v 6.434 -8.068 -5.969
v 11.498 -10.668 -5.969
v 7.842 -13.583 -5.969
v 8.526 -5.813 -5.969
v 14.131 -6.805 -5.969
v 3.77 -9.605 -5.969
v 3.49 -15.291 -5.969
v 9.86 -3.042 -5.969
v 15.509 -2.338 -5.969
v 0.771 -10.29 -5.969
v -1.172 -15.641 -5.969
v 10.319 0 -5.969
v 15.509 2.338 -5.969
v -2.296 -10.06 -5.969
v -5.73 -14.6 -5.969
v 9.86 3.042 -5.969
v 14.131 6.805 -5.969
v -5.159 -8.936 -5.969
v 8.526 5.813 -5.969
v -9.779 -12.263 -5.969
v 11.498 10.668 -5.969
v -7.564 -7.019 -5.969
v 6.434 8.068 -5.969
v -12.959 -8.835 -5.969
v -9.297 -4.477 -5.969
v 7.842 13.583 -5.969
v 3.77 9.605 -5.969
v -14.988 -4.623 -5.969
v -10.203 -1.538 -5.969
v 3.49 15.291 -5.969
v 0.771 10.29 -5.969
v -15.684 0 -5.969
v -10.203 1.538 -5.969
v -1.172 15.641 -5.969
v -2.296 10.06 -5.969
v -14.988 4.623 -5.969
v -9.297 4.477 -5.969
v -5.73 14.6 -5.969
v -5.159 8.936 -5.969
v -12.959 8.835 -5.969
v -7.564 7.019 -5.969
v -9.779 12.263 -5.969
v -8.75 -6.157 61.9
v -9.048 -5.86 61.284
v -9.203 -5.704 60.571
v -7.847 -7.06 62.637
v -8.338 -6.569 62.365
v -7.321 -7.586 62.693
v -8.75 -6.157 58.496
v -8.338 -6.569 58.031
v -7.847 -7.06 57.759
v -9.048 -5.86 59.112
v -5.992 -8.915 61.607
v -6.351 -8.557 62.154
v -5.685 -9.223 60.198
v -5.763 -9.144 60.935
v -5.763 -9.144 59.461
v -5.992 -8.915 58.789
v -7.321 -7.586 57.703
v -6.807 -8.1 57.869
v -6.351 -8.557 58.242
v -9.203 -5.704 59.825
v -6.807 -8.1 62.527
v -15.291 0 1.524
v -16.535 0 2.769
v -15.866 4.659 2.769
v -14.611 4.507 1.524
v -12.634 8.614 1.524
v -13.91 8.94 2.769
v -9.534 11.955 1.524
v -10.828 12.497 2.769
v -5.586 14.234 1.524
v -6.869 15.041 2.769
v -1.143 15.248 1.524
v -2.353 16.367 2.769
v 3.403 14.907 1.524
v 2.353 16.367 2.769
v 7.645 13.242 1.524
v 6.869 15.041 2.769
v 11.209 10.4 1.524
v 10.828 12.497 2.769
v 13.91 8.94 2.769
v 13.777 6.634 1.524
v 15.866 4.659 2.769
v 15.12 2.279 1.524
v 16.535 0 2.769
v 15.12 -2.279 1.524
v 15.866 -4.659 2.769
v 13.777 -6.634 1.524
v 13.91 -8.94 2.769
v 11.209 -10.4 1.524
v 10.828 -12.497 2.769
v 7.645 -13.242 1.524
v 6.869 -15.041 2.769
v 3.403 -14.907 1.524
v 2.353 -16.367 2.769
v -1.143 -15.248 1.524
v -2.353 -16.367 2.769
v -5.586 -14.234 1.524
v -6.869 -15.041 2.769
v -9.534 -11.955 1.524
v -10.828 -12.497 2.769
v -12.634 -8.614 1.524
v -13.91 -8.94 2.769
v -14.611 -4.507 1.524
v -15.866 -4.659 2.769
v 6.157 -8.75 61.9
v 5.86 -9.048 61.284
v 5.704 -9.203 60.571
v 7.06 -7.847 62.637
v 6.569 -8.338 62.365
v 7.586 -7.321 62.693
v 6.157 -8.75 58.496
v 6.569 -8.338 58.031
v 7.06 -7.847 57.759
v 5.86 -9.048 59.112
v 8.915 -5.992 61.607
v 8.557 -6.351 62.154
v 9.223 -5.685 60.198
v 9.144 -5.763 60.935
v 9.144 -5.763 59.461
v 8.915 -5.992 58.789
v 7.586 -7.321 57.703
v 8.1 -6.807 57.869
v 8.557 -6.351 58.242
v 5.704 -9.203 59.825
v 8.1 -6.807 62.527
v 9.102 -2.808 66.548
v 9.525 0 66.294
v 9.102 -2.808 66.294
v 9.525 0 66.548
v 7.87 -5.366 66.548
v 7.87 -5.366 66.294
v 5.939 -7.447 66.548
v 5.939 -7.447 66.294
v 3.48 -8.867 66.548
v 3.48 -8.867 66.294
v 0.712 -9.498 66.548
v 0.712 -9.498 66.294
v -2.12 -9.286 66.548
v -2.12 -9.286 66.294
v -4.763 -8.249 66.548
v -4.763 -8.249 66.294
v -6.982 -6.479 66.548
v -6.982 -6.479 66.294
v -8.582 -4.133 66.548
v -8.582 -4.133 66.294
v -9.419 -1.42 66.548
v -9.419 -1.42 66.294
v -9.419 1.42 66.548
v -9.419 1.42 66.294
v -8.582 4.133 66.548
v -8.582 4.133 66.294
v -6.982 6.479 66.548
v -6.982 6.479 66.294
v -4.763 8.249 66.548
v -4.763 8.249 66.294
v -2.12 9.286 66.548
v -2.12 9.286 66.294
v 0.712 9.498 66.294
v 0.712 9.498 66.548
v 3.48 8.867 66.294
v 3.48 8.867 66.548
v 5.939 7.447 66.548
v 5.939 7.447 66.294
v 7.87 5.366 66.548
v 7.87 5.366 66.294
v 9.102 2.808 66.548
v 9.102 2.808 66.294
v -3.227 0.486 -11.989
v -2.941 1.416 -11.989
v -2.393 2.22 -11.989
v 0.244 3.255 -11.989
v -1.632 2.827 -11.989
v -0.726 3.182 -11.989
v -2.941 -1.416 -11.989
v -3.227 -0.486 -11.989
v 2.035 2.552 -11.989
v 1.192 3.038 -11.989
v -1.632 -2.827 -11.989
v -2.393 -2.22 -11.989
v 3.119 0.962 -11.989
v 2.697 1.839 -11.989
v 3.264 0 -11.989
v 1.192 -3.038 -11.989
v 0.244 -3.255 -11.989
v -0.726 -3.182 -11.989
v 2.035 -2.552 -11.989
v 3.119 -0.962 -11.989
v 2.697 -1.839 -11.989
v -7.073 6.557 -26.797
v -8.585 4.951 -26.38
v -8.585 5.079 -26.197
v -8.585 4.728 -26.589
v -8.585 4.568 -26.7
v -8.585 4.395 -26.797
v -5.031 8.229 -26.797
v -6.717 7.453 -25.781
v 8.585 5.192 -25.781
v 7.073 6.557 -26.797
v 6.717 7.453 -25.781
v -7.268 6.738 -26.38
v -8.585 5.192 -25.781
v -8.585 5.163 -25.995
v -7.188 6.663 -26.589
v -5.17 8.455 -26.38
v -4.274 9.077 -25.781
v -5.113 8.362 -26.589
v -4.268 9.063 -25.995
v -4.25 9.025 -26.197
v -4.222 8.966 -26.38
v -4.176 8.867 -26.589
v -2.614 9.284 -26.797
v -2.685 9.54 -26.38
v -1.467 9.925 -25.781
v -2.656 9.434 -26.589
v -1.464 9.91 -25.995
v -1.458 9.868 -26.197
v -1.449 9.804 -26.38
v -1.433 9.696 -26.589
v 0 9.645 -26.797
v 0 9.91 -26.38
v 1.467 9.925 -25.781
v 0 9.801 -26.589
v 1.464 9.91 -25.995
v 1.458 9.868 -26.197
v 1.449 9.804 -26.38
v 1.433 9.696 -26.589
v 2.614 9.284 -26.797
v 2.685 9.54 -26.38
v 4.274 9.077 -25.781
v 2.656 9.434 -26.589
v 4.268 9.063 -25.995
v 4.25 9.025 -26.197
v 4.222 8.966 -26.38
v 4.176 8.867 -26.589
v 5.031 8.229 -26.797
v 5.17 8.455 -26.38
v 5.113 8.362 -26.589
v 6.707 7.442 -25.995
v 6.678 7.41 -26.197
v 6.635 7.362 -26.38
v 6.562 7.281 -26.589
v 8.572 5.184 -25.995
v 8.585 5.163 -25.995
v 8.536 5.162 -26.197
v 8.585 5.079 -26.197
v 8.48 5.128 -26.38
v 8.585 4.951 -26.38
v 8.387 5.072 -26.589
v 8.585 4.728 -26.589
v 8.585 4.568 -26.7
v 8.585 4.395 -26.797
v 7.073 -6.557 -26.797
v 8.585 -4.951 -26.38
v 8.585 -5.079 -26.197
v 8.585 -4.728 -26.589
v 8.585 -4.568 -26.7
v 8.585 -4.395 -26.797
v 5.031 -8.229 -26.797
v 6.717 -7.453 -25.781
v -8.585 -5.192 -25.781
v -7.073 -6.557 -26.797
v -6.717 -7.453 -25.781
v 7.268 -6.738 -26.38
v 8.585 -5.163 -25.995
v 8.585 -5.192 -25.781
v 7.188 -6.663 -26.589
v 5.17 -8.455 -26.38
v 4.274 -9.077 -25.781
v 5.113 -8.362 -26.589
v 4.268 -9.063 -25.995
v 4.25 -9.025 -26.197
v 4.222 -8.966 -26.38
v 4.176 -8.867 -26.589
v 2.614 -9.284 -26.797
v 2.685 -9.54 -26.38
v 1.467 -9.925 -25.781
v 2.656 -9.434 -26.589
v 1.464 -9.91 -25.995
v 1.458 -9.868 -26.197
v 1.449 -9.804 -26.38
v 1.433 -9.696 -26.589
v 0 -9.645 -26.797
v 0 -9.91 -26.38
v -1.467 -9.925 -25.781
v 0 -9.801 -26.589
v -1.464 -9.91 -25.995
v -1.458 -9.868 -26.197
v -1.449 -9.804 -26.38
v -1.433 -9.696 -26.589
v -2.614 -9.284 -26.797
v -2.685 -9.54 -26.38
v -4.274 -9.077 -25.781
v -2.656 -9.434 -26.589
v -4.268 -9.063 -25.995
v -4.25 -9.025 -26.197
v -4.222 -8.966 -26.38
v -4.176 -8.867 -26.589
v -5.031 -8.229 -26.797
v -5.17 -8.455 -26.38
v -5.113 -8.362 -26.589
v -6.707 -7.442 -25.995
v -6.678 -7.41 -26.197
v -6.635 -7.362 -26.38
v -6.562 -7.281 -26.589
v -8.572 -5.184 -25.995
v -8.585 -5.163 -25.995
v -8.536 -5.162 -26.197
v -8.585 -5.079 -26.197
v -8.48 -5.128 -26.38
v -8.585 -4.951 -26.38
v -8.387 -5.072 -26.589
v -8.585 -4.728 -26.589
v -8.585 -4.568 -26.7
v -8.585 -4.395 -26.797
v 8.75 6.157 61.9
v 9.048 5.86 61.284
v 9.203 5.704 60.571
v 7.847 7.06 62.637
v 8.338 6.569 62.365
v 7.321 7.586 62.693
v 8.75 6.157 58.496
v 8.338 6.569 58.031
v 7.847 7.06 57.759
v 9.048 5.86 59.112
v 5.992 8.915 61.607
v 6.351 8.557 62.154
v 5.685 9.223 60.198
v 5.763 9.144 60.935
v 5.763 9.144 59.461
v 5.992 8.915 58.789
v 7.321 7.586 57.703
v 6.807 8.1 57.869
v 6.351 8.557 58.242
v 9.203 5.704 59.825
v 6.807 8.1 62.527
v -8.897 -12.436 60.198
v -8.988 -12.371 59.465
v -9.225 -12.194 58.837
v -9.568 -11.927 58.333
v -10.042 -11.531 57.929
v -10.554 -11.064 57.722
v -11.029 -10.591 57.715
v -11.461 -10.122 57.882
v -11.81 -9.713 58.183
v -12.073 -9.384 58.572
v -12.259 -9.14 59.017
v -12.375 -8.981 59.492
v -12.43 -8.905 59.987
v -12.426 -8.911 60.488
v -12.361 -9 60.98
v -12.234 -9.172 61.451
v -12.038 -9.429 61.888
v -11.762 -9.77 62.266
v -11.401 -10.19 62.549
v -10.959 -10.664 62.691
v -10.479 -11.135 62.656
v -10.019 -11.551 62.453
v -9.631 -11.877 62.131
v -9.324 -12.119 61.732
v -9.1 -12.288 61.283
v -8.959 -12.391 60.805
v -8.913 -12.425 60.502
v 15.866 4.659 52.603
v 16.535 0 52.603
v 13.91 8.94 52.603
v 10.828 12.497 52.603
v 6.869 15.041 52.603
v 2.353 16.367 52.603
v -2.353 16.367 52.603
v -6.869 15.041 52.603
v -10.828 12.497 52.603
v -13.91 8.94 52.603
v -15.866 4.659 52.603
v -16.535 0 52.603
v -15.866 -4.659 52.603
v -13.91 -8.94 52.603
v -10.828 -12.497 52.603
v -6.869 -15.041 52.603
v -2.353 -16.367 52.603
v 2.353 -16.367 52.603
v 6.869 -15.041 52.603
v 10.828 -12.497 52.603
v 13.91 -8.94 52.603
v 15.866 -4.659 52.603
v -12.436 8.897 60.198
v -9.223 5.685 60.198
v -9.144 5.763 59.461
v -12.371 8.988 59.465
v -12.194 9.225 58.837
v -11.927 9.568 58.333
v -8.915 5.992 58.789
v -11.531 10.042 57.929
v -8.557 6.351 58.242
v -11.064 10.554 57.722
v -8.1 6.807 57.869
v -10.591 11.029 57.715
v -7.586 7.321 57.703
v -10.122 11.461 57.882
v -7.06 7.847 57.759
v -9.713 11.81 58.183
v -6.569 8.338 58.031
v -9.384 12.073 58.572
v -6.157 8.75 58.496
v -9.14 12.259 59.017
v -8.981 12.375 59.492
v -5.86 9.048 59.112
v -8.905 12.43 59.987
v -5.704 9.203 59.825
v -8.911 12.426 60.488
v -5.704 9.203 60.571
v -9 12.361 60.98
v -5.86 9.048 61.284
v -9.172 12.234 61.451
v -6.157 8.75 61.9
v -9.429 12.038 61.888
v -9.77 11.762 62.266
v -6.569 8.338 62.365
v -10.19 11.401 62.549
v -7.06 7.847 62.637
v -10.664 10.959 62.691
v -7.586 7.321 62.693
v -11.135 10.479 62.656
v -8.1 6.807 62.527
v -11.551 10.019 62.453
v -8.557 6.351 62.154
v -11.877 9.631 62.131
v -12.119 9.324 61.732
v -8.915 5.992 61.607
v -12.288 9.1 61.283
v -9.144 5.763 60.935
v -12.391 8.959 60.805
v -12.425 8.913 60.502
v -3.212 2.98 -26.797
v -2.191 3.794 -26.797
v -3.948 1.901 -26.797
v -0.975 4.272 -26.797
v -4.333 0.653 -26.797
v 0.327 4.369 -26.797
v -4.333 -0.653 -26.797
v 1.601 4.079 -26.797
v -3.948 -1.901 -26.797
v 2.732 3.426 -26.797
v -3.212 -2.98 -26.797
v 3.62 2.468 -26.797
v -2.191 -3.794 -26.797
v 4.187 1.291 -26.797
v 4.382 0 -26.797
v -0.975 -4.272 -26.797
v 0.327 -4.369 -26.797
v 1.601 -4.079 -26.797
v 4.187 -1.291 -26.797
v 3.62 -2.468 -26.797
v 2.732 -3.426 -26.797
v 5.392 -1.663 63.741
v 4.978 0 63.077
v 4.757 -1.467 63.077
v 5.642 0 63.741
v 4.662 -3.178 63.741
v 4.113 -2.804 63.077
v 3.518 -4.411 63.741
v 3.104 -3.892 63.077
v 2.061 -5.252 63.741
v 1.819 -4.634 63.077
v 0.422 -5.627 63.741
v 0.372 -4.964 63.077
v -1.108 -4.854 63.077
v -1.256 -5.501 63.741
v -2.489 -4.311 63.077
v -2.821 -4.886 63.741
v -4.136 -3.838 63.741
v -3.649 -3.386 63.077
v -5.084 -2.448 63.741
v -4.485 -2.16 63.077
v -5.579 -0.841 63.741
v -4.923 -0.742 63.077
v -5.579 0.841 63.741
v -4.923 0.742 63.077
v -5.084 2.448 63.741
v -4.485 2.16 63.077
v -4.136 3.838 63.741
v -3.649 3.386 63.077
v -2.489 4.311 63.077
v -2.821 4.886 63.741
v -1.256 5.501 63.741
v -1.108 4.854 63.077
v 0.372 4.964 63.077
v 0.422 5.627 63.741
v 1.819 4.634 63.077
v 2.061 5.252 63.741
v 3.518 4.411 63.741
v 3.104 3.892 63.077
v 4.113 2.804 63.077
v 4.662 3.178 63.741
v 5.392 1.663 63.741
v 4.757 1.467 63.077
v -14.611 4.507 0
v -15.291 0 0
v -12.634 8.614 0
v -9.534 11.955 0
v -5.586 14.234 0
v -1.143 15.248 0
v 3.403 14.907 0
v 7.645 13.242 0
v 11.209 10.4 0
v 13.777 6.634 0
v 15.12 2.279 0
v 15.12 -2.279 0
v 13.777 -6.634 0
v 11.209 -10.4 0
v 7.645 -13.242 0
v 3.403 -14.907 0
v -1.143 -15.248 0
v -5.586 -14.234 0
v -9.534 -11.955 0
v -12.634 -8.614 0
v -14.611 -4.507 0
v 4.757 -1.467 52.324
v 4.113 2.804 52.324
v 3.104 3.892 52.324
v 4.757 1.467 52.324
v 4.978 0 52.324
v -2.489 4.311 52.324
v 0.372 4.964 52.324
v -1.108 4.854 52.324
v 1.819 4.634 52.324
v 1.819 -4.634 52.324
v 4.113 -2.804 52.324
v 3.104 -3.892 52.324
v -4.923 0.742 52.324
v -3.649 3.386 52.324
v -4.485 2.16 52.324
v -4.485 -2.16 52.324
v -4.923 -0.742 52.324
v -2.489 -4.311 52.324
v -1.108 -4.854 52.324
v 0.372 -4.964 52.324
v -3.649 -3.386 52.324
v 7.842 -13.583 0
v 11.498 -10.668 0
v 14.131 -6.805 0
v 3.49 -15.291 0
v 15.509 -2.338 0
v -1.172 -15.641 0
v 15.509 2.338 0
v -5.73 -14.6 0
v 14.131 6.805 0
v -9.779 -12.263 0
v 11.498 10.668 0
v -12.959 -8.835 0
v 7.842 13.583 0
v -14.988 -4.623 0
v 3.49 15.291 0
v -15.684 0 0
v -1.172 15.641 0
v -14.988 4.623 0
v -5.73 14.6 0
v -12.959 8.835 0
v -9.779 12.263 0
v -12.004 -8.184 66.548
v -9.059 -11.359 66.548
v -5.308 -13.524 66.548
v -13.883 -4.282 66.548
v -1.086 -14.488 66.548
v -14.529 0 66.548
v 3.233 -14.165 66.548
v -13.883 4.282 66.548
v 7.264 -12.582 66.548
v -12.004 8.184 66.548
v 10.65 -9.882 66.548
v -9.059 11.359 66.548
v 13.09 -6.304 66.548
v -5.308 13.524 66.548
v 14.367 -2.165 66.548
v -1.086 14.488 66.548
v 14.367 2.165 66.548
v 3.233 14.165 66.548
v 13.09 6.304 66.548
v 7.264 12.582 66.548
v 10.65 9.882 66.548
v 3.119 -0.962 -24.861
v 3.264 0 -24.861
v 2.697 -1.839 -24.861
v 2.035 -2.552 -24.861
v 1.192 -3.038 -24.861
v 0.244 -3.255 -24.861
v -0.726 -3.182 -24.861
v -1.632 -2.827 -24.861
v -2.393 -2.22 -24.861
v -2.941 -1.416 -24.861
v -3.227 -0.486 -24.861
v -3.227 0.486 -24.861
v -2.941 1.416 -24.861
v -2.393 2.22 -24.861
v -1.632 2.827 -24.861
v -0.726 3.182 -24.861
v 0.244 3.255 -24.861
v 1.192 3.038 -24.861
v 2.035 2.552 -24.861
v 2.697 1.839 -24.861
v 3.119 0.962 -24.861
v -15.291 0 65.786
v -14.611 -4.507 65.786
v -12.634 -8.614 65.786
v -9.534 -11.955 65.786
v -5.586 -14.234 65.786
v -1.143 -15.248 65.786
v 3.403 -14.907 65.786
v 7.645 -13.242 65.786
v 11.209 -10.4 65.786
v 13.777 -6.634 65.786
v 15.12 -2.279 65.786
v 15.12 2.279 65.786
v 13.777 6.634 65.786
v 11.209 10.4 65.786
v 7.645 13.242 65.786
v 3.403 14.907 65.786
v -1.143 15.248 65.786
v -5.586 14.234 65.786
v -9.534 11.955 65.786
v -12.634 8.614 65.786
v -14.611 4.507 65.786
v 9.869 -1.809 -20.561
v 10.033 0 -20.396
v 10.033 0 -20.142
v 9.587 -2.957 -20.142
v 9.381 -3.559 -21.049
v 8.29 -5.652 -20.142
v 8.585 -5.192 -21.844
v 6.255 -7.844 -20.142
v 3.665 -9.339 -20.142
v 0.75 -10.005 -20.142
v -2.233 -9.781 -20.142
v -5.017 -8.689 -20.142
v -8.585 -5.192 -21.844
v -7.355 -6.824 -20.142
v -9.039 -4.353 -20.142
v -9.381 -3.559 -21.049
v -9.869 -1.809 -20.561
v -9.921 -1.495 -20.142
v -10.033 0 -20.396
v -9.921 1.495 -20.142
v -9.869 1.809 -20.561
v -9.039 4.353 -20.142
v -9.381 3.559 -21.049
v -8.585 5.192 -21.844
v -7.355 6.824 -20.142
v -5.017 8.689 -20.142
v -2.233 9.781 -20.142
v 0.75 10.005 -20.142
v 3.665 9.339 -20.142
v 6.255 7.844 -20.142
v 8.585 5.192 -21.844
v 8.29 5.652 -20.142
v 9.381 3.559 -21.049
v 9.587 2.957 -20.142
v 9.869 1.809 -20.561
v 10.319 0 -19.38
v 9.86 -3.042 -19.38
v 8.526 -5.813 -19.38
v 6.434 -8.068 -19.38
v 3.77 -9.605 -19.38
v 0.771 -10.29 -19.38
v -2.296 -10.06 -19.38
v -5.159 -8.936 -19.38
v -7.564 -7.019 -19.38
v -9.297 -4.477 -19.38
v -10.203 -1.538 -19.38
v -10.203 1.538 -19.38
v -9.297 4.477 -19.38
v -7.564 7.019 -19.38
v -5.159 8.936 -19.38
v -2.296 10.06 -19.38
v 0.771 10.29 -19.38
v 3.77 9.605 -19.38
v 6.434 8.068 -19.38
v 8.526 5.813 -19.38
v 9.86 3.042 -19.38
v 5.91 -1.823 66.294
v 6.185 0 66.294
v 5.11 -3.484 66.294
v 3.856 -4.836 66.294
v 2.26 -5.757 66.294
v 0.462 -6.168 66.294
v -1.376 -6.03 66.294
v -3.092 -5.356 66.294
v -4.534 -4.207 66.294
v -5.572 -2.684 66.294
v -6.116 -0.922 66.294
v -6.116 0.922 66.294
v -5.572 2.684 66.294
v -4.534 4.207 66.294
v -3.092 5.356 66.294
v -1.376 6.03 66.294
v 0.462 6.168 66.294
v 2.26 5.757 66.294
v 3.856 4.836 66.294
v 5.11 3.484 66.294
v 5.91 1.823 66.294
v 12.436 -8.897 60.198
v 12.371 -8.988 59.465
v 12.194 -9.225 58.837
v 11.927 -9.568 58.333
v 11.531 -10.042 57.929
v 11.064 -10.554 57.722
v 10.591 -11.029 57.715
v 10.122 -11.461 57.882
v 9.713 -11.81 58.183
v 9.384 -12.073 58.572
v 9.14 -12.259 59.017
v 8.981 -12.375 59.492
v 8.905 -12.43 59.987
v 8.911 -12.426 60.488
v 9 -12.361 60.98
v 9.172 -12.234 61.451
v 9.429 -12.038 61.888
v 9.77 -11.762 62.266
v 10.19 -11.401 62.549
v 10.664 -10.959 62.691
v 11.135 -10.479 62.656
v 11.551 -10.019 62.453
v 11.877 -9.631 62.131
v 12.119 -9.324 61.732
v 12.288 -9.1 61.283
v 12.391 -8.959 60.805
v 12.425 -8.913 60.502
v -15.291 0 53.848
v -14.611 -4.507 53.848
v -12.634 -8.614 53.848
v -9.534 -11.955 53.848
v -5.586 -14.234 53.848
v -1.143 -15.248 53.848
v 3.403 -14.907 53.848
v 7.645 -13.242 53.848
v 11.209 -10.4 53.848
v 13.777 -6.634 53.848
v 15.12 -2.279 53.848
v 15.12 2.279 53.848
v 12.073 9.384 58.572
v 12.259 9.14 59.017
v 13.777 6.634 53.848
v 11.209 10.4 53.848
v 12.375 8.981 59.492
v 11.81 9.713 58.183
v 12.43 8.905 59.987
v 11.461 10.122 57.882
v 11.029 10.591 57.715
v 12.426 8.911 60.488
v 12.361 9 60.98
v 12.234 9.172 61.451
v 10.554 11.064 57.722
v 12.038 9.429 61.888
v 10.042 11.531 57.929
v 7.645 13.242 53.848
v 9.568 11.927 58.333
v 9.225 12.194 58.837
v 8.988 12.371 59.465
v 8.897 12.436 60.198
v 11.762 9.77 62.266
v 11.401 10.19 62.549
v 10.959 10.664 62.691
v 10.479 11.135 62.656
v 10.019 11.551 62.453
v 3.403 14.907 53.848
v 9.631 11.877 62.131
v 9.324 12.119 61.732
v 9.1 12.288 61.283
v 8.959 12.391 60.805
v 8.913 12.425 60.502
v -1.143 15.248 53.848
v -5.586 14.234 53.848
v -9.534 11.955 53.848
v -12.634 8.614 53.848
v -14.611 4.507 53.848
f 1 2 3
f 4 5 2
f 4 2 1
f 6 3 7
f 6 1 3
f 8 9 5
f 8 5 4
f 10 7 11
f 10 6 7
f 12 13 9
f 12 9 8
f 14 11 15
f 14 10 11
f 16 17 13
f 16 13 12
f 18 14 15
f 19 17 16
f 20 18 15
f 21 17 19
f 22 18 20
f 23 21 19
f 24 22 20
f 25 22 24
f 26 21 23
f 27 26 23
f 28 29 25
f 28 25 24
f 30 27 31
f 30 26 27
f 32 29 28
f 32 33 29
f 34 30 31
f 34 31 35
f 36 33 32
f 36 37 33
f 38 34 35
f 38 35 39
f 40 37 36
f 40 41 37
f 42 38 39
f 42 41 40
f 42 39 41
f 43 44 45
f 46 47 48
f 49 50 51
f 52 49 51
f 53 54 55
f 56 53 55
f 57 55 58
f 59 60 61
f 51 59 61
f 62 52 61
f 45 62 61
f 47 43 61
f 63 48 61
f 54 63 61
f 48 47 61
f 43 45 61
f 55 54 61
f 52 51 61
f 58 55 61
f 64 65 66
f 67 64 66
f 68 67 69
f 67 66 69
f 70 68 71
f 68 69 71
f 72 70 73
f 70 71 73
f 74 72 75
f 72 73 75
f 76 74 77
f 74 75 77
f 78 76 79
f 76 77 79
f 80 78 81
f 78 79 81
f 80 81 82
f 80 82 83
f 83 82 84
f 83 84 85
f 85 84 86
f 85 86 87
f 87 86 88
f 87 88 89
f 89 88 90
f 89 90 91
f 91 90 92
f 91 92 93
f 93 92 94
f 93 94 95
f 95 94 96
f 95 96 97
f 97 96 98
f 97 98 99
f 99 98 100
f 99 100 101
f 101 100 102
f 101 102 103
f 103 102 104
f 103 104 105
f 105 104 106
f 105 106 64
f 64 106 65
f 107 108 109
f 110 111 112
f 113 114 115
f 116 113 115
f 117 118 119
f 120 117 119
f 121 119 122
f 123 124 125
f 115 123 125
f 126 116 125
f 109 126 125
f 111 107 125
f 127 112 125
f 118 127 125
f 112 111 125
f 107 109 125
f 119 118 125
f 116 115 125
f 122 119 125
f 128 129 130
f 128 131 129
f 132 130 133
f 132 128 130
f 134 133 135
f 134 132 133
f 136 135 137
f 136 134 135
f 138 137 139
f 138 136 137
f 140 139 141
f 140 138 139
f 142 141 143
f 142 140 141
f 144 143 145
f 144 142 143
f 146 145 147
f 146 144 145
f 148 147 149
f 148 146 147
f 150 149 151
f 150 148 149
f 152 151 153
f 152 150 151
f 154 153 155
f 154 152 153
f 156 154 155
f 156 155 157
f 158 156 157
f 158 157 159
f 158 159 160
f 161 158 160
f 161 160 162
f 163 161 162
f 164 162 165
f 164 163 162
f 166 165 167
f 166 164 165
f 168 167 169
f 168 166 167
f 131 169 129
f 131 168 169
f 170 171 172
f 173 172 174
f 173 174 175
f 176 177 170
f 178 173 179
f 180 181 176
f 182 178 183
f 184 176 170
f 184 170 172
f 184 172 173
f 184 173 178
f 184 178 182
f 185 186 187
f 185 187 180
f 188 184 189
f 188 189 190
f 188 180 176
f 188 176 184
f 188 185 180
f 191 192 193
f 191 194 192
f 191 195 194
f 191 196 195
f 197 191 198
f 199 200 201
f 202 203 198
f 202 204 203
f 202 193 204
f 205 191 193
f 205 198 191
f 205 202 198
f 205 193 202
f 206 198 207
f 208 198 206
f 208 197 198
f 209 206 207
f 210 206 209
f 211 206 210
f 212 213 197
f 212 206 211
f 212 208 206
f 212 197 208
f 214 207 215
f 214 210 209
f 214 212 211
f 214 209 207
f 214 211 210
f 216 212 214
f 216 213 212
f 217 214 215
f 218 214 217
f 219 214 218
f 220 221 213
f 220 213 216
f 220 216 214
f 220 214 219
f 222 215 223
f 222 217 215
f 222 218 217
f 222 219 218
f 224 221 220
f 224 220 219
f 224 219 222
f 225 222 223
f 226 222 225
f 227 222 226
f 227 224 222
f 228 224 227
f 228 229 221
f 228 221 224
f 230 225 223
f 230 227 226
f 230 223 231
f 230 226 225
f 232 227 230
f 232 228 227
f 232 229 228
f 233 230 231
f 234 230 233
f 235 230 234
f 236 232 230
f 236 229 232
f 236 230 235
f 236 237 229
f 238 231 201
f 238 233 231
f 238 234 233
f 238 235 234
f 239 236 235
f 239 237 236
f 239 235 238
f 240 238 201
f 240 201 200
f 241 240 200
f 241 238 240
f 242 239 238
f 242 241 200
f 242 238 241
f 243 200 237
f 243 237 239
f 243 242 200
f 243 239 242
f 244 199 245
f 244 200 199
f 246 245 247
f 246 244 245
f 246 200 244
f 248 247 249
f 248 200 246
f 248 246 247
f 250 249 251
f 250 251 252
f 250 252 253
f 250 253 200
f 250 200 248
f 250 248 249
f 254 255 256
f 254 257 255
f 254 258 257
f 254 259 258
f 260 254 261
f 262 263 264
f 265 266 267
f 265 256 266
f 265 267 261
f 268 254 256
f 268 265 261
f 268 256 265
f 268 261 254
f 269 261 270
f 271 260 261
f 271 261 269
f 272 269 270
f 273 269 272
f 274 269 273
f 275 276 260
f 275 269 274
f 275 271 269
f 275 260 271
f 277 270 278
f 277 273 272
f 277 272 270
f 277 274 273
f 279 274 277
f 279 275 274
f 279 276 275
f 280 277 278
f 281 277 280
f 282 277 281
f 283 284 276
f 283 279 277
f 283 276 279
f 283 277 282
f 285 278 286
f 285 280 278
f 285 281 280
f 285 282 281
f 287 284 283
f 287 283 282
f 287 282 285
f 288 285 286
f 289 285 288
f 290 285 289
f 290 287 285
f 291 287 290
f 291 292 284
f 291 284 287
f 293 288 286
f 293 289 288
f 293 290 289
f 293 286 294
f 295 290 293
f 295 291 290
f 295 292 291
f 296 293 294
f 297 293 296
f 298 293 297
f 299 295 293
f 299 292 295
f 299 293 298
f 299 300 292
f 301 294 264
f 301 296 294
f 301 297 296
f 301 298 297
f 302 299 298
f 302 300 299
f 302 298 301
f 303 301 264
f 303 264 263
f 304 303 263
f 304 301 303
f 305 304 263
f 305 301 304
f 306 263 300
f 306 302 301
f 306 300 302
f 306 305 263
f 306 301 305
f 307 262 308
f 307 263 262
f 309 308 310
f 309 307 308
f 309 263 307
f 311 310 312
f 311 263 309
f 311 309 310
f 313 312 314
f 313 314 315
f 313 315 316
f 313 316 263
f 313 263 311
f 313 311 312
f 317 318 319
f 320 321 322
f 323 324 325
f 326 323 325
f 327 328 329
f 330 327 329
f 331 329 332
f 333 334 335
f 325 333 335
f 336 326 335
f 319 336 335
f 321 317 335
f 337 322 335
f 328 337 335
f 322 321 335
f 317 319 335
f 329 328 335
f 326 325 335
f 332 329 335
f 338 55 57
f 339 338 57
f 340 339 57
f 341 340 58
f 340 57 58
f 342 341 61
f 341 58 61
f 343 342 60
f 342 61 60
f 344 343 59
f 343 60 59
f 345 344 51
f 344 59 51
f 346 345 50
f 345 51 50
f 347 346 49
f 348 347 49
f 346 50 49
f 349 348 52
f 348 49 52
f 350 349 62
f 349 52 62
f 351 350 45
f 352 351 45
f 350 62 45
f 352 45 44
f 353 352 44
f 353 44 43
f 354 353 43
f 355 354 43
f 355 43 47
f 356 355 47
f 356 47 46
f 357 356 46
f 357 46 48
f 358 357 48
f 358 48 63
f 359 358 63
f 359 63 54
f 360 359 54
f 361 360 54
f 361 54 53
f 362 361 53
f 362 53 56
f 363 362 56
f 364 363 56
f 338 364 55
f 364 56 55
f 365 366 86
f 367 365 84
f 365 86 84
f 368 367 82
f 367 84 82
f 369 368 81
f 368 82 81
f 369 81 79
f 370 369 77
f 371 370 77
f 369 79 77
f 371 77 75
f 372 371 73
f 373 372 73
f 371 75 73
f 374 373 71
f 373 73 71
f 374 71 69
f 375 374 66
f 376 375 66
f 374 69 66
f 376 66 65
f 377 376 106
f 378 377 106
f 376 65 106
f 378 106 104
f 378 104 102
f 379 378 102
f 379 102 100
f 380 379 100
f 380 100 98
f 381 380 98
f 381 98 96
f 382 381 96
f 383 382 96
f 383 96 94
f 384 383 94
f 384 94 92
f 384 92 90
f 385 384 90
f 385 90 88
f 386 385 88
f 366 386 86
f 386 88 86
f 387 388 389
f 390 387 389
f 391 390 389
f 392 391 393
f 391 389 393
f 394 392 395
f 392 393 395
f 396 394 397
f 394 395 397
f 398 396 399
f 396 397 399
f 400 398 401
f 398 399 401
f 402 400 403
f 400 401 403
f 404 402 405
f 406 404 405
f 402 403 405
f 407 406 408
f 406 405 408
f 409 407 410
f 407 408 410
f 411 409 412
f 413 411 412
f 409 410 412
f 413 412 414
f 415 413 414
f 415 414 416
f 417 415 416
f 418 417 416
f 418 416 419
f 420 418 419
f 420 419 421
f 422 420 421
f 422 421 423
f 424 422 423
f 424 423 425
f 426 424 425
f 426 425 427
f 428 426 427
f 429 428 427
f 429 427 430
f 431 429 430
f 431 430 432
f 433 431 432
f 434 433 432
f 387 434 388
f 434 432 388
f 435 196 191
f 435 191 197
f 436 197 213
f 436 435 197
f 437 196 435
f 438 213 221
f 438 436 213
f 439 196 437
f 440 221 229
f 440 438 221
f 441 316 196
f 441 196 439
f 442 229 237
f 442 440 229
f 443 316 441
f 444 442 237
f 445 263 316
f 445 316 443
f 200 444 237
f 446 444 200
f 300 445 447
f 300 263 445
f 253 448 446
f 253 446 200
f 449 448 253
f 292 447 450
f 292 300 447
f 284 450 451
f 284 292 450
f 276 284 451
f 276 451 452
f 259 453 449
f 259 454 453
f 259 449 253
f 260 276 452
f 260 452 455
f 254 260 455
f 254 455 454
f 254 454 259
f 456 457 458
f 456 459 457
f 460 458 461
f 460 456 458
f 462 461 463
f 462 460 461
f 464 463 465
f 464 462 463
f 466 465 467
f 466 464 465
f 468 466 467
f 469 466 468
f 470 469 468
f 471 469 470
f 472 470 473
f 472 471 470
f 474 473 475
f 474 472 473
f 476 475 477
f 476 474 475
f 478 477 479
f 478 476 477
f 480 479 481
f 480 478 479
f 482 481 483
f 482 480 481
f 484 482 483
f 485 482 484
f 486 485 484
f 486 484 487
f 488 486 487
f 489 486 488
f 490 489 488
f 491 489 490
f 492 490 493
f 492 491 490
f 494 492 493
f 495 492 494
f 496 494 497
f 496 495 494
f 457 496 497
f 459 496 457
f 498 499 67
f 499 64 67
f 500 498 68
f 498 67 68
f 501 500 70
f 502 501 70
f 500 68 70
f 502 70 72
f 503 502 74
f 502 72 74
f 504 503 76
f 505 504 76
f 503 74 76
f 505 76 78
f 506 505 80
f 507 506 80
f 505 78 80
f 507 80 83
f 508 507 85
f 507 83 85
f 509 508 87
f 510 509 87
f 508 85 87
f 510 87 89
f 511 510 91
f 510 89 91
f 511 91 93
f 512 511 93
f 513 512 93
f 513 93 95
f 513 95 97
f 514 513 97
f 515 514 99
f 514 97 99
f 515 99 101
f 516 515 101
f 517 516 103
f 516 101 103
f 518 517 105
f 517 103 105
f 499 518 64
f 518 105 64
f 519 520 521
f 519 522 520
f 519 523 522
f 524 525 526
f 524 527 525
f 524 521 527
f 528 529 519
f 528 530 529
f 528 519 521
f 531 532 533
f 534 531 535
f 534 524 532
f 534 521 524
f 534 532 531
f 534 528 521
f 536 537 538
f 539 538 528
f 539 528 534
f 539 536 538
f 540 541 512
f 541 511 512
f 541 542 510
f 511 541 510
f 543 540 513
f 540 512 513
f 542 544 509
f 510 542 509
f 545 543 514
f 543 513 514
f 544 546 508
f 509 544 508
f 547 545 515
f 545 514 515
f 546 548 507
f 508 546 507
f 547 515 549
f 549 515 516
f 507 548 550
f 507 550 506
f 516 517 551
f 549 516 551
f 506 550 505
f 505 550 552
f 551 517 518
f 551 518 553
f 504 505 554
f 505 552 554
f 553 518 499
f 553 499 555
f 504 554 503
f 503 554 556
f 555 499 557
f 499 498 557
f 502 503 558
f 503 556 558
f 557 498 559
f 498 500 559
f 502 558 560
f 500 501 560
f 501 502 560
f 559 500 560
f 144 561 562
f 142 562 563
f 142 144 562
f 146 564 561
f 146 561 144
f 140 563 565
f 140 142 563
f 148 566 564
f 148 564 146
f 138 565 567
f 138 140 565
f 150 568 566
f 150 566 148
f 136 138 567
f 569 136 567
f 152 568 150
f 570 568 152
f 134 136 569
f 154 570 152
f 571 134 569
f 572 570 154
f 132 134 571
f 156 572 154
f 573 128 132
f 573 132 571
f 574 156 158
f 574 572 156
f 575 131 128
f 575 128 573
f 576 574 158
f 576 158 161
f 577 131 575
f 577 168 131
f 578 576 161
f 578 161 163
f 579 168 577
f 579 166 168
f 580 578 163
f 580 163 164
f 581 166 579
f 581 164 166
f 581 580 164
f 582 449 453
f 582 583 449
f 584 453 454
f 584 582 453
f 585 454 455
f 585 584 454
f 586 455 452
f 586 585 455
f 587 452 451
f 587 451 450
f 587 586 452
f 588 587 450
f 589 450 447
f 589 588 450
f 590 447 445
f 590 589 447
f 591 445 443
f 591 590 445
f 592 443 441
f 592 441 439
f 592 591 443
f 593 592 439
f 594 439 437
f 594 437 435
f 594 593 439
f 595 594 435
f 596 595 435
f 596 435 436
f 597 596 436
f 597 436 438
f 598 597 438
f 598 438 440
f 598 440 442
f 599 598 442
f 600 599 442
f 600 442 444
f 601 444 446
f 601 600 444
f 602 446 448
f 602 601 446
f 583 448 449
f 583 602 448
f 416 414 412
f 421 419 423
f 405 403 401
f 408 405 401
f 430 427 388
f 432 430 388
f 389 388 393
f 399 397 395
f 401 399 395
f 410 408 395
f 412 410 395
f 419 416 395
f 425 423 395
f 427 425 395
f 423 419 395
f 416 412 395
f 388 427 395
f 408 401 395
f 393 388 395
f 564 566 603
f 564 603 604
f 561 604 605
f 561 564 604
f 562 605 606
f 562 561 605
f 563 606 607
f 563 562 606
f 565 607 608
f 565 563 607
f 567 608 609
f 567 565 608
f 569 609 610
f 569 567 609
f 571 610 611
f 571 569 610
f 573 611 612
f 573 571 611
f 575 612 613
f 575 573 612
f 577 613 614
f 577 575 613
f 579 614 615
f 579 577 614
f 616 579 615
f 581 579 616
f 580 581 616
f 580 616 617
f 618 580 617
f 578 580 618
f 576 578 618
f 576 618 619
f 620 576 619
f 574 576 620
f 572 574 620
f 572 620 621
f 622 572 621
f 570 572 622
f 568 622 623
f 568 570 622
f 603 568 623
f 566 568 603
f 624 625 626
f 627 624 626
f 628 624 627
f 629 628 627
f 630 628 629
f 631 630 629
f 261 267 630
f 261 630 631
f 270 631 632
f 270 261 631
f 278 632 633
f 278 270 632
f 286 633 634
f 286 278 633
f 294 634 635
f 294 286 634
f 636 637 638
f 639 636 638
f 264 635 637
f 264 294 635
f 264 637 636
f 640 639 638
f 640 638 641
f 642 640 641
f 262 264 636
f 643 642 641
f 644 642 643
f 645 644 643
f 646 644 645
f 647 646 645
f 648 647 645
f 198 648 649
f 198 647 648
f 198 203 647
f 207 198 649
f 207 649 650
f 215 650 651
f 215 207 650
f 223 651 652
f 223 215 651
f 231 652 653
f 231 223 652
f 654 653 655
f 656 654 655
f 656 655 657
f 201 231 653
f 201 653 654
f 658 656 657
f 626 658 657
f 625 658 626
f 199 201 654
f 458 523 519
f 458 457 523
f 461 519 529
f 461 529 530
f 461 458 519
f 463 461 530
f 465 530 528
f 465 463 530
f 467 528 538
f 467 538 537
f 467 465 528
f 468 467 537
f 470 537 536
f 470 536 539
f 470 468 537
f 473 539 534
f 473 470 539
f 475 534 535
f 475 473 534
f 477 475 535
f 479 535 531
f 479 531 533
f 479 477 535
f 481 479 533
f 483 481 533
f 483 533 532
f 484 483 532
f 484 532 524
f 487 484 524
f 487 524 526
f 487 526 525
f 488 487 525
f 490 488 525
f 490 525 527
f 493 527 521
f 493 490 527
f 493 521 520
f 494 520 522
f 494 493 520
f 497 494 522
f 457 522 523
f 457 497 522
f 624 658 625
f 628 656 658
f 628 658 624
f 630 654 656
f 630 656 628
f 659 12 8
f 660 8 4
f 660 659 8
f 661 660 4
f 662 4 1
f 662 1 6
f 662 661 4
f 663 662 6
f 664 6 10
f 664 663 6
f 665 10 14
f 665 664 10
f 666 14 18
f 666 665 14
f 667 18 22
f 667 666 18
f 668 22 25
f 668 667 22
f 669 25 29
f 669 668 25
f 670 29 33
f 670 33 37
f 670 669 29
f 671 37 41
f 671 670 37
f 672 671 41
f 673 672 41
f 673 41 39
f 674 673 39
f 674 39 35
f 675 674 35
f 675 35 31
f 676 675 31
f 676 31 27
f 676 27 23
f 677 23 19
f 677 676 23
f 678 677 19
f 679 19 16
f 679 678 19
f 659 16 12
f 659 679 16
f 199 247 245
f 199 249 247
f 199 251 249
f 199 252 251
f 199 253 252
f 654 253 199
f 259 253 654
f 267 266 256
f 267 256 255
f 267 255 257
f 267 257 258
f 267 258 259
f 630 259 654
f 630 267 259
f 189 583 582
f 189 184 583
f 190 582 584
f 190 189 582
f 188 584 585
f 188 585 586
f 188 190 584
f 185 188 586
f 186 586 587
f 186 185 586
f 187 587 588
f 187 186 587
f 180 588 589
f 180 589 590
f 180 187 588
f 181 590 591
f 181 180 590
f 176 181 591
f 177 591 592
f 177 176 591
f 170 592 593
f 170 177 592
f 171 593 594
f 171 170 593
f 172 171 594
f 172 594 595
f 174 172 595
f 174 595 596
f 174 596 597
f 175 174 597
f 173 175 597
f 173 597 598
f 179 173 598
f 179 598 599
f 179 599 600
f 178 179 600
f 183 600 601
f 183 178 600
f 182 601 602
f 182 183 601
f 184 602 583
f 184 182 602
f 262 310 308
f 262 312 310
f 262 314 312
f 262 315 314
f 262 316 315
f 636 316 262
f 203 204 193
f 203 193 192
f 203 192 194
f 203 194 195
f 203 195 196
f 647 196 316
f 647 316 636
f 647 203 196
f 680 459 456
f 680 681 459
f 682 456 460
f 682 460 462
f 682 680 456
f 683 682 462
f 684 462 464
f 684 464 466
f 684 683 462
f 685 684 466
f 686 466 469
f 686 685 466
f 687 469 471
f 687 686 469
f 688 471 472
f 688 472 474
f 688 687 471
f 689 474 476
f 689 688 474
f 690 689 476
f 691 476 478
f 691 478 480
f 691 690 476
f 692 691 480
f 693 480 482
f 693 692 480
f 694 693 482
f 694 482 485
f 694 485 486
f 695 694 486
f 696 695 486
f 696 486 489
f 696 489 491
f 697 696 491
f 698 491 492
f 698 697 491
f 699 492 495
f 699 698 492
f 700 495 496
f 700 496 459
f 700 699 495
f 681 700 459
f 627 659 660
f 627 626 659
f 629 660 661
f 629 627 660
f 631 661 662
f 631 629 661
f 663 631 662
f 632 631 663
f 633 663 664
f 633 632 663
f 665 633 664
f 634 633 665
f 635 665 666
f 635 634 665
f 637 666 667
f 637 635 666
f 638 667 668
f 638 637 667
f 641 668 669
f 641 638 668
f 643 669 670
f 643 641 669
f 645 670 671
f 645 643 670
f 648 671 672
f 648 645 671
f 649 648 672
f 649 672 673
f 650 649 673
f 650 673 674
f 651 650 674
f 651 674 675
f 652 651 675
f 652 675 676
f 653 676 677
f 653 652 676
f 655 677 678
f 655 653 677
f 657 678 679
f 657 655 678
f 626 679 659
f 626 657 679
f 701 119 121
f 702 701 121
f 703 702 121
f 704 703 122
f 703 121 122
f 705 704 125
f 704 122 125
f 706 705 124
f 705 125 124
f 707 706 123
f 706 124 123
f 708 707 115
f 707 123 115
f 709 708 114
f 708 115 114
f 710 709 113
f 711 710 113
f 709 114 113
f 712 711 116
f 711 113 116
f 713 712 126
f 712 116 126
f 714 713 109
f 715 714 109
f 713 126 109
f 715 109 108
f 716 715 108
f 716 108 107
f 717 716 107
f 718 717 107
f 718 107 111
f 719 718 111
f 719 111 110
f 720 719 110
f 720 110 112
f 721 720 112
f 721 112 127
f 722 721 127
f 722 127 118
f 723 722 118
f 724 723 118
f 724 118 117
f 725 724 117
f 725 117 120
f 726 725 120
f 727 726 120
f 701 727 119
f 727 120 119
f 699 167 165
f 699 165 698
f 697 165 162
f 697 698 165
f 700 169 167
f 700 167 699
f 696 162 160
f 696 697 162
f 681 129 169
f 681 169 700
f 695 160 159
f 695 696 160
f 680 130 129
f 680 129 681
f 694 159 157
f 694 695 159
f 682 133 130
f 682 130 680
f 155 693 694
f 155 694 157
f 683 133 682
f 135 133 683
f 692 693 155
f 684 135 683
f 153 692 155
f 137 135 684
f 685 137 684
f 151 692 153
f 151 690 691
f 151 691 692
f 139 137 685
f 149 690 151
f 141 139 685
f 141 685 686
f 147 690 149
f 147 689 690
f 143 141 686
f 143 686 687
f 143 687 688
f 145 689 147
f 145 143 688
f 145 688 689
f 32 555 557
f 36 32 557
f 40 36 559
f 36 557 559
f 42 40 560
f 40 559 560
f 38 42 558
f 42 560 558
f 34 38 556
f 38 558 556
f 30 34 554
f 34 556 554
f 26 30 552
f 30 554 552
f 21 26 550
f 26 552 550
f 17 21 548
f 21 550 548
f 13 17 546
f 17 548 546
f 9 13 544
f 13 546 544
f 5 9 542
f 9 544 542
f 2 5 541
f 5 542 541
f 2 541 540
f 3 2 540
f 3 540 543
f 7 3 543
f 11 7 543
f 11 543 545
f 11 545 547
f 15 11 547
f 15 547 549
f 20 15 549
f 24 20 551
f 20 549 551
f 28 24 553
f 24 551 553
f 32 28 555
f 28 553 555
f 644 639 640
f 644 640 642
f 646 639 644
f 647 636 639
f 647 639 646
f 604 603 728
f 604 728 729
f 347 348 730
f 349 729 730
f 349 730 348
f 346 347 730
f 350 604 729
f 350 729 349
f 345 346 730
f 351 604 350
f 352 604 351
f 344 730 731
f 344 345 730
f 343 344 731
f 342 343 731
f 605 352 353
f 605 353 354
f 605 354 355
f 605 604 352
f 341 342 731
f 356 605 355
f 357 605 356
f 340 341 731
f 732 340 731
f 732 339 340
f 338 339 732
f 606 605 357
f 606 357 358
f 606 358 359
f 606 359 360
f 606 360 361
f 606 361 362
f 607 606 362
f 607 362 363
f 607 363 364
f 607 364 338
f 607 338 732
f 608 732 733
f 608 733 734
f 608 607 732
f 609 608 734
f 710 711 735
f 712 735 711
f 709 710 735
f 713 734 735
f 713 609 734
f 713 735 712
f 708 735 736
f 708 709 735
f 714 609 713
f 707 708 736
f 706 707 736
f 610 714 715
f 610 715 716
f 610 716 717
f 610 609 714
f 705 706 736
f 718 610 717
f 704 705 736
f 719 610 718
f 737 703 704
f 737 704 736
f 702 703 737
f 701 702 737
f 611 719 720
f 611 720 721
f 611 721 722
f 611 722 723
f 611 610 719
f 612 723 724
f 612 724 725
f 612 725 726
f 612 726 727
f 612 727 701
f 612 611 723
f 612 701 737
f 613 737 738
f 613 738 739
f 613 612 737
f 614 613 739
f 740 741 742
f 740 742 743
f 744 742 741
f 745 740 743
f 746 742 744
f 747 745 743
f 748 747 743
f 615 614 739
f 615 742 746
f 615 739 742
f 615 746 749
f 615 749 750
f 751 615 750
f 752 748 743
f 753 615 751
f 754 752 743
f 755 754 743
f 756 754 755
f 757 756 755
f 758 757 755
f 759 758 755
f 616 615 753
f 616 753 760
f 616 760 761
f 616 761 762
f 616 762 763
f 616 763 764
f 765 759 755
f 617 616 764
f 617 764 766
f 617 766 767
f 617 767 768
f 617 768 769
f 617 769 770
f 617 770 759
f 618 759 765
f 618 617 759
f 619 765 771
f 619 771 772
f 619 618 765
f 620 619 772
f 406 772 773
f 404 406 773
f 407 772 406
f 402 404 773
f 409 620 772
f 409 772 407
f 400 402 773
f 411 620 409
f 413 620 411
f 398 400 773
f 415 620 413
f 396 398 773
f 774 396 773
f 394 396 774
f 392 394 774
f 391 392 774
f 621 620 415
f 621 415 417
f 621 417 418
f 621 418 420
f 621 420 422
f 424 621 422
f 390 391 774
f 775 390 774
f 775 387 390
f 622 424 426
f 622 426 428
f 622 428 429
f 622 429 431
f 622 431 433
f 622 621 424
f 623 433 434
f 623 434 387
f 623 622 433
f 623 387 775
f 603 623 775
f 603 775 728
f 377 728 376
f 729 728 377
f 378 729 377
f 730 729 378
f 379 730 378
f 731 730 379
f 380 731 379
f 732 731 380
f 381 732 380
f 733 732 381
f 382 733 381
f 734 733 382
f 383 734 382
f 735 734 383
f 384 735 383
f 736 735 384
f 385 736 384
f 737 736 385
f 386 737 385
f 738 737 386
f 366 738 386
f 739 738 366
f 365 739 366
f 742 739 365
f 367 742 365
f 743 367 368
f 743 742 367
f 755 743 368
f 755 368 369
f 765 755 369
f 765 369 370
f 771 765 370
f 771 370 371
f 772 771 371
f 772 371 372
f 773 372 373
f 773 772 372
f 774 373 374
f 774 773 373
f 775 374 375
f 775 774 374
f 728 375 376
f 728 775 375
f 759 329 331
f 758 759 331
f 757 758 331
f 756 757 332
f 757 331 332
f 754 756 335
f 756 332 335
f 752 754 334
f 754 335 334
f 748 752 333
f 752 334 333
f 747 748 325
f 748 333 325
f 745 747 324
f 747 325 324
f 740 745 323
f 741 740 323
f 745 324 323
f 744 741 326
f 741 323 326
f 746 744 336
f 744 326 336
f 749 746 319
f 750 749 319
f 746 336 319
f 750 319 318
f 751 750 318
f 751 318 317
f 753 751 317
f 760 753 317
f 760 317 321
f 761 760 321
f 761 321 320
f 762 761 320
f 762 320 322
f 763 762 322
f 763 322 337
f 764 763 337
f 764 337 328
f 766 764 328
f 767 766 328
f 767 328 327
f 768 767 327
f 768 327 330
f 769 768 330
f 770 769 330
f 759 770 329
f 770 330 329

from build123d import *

# Parameters (mm, degrees)
SKETCH1_R          = 16.5354
EXTRUDE1_DEPTH     = 66.548
CHAMFER1_SIZE      = 0.762
SKETCH6_R          = 15.6845
EXTRUDE2_DEPTH     = 5.969
SKETCH7_W          = 20.828
SKETCH7_H          = 10.31875
CUT_EXTRUDE4_DEPTH = 19.84248
HOLE1_D            = 5.0038
HOLE1_DEPTH        = 4.7498
CIRPATTERN1_COUNT  = 4


with BuildPart() as part:
    # Sketch1 → Extrude1 (new body)
    with BuildSketch(Plane.XY):
        Circle(SKETCH1_R)
    extrude(amount=EXTRUDE1_DEPTH)

    # Sketch2 → Cut-Revolve1 (revolve, cut)
    with BuildSketch(Plane(origin=(0, 0, 0), x_dir=(1, 0, 0), z_dir=(0, 1, 0)), mode=Mode.PRIVATE) as cut_revolve1_sk:
        Polygon((16.5354, -66.548), (16.5354, -52.6034), (15.2908, -53.848), (15.2908, -66.548), align=None)
    revolve(cut_revolve1_sk.sketch.rotate(Axis((0, 0, 0), (0, 0, 1)), 180), axis=Axis((0, 0, 0), (0, 0, 1)), mode=Mode.SUBTRACT)  # turned: the seam where the file's is

    # Sketch3 → Cut-Revolve2 (revolve, cut)
    with BuildSketch(Plane(origin=(0, 0, 0), x_dir=(1, 0, 0), z_dir=(0, 1, 0)), mode=Mode.PRIVATE) as cut_revolve2_sk:
        Polygon((15.2908, 0), (15.2908, -1.524), (16.5354, -2.7686), (16.5354, 0), align=None)
    revolve(cut_revolve2_sk.sketch.rotate(Axis((0, 0, 0), (0, 0, -1)), 180), axis=Axis((0, 0, 0), (0, 0, -1)), mode=Mode.SUBTRACT)  # turned: the seam where the file's is

    # S2D0002 → Cut-Revolve3 (revolve, cut)
    with BuildSketch(Plane(origin=(0, 0, 0), x_dir=(1, 0, 0), z_dir=(0, 1, 0))):
        Polygon((6.1849, -66.294), (9.525, -66.294), (9.525, -66.548), (0, -66.548), (0, -52.324), (4.9784, -52.324), (4.9784, -63.077393135), (5.642306865, -63.7413), align=None)
    revolve(axis=Axis((0, 0, 14.6685), (0, 0, -1)), mode=Mode.SUBTRACT)

    # Chamfer1
    chamfer1_edges = [part.edges().sort_by_distance(p)[0] for p in [
        (15.2908, 0, 66.548),
    ]]
    chamfer(chamfer1_edges, length=CHAMFER1_SIZE)

    # Sketch6 → Extrude2 (add)
    with BuildSketch(Plane(origin=(0, 0, 0), x_dir=(-1, 0, 0), z_dir=(0, 0, -1))):
        Circle(SKETCH6_R)
    extrude(amount=EXTRUDE2_DEPTH)

    # Sketch7 → Revolve1 (revolve)
    with BuildSketch(Plane(origin=(0, 0, 0), x_dir=(0, 0, -1), z_dir=(1, 0, 0)), mode=Mode.PRIVATE) as revolve1_sk:
        with Locations((16.383, -5.159375)):
            Rectangle(SKETCH7_W, SKETCH7_H)
    revolve(revolve1_sk.sketch.rotate(Axis((0, 0, 0), (0, 0, -1)), 270), axis=Axis((0, 0, 0), (0, 0, -1)))  # turned: the seam where the file's is

    # S2D0001 → Cut-Revolve5 (revolve, cut)
    with BuildSketch(Plane(origin=(0, 0, 0), x_dir=(1, 0, 0), z_dir=(0, 1, 0))):
        Polygon((3.2639, 24.861260017), (3.2639, 11.9888), (0, 11.9888), (0, 26.797), (4.3815, 26.797), align=None)
    revolve(axis=Axis((0, 0, 31.308359971), (0, 0, -1)), mode=Mode.SUBTRACT)

    # Sketch9 → Cut-Revolve6 (revolve, cut)
    with BuildSketch(Plane(origin=(0, 0, 0), x_dir=(0, -1, 0), z_dir=(1, 0, 0)), mode=Mode.PRIVATE) as cut_revolve6_sk:
        with BuildLine():
            Line((-10.31875, 19.3802), (-10.033, 20.1422))
            Line((-10.033, 20.1422), (-10.033, 25.781))
            ThreePointArc((-10.033, 25.781), (-9.932678675, 26.324796865), (-9.644922533, 26.797))
            Line((-9.644922533, 26.797), (-10.31875, 26.797))
            Line((-10.31875, 26.797), (-10.31875, 19.3802))
        make_face()
    revolve(cut_revolve6_sk.sketch.rotate(Axis((0, 0, -12.65936), (0, 0, -1)), 90), axis=Axis((0, 0, -12.65936), (0, 0, -1)), mode=Mode.SUBTRACT)  # turned: the seam where the file's is

    # Sketch13 → Cut-Extrude4 (cut, symmetric)
    with BuildSketch(Plane(origin=(0, 0, 0), x_dir=(1, 0, 0), z_dir=(0, 1, 0))):
        Polygon((8.5852, 26.797), (8.5852, 21.844), (10.033, 20.3962), (10.033, 26.797), align=None)
        Polygon((-8.5852, 26.797), (-8.5852, 21.844), (-10.033, 20.3962), (-10.033, 26.797), align=None)
    extrude(amount=CUT_EXTRUDE4_DEPTH, both=True, mode=Mode.SUBTRACT)

    # Hole1
    with Locations(Plane(origin=(-10.81222837, 10.81222837, 60.198), x_dir=(0.707106781, 0.707106781, 0), z_dir=(-0.707106781, 0.707106781, 0))):
        with Locations((0, 0)):
            hole1 = Hole(HOLE1_D / 2, depth=HOLE1_DEPTH)

    # CirPattern1: Hole1 ×4 about axis
    cirpattern1_axis = Axis((0, 0, 0), (0, 0, 1))
    for i in range(1, CIRPATTERN1_COUNT):
        add(hole1.rotate(cirpattern1_axis, i * 360 / CIRPATTERN1_COUNT), mode=Mode.SUBTRACT)


solid = part.part
